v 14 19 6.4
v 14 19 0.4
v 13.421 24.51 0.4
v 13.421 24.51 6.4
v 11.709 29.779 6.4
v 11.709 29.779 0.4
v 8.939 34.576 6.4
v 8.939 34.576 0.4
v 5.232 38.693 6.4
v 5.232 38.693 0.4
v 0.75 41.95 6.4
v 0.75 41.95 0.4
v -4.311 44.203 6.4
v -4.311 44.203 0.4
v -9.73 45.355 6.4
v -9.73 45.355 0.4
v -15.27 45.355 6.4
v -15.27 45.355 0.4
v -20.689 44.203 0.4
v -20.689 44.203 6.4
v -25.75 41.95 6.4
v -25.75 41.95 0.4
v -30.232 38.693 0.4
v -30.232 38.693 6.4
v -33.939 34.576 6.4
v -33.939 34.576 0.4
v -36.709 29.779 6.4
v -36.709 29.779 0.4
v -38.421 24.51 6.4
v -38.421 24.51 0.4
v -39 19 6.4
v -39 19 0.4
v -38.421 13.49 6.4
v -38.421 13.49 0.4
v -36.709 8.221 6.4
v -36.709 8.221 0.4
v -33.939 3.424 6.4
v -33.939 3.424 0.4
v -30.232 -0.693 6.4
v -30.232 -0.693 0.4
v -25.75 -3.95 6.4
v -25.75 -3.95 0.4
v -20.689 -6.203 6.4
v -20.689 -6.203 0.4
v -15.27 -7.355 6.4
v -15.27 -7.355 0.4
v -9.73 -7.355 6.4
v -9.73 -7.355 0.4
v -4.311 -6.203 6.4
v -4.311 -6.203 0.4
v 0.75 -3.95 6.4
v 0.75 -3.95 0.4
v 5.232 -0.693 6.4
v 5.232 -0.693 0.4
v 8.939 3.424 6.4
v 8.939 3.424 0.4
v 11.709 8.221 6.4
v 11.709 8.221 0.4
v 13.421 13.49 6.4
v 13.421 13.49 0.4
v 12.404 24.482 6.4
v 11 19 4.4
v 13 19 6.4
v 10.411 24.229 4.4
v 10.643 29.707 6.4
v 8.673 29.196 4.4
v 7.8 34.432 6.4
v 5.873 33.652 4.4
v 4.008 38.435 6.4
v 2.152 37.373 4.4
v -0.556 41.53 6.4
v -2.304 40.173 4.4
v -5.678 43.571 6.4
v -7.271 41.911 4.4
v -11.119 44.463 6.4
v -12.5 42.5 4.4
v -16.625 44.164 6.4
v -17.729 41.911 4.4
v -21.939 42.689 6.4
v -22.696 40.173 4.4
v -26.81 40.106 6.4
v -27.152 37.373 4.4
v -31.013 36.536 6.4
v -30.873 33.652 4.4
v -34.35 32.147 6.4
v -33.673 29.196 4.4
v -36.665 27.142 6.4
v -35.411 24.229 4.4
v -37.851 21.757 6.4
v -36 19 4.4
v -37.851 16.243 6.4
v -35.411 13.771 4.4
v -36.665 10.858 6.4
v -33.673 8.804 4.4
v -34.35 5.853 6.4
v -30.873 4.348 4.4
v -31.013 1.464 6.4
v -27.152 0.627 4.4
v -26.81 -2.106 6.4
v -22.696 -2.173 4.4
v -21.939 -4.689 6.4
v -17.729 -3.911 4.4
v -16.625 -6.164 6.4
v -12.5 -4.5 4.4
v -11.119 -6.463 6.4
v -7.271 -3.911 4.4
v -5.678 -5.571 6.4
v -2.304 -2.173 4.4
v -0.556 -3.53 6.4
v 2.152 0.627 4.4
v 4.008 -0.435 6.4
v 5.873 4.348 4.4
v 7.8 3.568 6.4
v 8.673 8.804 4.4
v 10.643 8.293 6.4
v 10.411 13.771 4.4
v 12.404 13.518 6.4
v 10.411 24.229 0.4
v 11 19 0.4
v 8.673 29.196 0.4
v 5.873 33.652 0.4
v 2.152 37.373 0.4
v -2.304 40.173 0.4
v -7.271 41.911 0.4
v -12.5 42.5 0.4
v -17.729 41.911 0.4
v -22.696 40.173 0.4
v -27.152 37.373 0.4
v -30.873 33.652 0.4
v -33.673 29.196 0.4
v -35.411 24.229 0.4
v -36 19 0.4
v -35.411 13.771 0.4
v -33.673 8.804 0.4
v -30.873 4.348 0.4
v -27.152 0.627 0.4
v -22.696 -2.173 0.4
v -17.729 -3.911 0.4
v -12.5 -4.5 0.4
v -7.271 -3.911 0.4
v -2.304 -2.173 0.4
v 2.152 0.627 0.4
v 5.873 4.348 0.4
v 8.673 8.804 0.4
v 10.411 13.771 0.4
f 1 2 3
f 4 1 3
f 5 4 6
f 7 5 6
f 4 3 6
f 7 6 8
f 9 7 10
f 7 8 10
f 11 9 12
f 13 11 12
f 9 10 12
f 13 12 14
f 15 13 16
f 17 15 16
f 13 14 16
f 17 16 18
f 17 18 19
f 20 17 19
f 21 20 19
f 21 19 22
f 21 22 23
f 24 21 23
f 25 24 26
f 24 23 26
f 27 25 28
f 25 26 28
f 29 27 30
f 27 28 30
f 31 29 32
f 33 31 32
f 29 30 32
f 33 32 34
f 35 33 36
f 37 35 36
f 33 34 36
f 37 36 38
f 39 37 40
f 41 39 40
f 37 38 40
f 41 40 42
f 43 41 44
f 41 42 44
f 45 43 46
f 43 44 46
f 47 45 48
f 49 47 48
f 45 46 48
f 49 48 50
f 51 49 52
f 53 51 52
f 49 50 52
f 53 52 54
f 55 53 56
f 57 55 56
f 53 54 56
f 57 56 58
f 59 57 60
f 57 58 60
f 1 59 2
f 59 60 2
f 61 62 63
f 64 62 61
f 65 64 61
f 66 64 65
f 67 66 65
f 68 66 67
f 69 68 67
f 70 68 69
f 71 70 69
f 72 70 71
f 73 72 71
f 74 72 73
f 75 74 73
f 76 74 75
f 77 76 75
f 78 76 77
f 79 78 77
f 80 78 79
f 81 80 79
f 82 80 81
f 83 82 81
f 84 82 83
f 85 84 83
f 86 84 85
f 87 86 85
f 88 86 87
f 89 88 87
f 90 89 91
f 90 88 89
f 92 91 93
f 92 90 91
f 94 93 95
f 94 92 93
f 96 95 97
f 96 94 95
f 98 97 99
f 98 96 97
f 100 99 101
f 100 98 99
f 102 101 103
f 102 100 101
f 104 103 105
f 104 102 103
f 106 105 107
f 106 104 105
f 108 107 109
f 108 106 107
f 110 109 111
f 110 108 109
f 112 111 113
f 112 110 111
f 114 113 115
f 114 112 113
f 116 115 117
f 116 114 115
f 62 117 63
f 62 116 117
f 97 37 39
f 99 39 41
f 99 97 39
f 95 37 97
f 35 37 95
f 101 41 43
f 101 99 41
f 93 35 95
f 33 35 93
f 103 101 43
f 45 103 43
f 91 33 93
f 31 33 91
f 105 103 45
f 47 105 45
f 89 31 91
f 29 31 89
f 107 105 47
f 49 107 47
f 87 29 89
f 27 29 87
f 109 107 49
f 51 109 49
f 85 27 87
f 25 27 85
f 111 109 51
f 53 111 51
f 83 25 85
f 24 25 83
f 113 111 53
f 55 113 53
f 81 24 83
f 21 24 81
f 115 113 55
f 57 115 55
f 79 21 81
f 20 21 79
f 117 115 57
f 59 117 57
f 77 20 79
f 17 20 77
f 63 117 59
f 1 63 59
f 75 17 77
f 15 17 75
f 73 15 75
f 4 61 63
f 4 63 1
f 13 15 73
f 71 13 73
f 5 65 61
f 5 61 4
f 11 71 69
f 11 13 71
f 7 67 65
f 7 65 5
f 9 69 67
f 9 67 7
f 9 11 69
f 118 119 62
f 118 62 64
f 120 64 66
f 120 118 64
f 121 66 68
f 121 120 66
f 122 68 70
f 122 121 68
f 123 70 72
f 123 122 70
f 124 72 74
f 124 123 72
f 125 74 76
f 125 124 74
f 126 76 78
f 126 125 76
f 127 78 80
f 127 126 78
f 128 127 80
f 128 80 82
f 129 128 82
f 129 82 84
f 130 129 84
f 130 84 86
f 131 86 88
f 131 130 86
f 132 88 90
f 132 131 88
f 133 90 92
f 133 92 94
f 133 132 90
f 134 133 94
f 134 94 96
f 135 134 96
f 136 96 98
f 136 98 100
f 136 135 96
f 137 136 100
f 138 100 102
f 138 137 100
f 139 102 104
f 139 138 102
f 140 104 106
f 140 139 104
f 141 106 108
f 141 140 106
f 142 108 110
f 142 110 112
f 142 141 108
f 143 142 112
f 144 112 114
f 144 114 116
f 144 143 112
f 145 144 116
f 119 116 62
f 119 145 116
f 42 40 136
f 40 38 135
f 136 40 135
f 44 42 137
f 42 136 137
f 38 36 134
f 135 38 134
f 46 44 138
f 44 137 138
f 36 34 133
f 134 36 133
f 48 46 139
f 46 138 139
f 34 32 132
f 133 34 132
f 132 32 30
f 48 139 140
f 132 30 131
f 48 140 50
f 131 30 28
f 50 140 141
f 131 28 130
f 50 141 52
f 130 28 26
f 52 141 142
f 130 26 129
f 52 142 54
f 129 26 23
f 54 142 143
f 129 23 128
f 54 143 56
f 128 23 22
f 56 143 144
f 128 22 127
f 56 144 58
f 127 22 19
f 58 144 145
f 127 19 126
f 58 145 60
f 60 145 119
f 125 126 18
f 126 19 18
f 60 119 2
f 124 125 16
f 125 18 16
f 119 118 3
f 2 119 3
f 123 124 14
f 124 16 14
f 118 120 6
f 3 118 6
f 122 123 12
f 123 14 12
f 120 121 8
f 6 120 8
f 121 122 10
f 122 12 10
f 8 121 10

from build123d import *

# Parameters (mm, degrees)
CYLINDER025_R     = 23.5
CYLINDER025_DEPTH = 6
CYLINDER024_R     = 26.5
CYLINDER024_DEPTH = 6
CHAMFER013_SIZE   = 2


with BuildPart() as arco_interior_vaciado:
    # Cylinder025 → Cylinder025 (new body)
    with BuildSketch(Plane(origin=(-12.5, 19, -10.6), x_dir=(1, 0, 0), z_dir=(0, 0, 1))):
        Circle(CYLINDER025_R)
    extrude(amount=CYLINDER025_DEPTH)


with BuildPart() as aro:
    # Cylinder024 → Cylinder024 (new body)
    with BuildSketch(Plane(origin=(-12.5, 19, -10.6), x_dir=(1, 0, 0), z_dir=(0, 0, 1))):
        Circle(CYLINDER024_R)
    extrude(amount=CYLINDER024_DEPTH)

    # Cut012: cut arco interior vaciado
    add(arco_interior_vaciado.part, mode=Mode.SUBTRACT)


with BuildPart() as aro_1:
    # Cut012 placement: moved
    add(aro.part.moved(Location((0, 0, 11))))

    # Chamfer013
    chamfer013_edges = [aro_1.edges().sort_by_distance(p)[0] for p in [
        (-36, 19, 6.4),
    ]]
    chamfer(chamfer013_edges, length=CHAMFER013_SIZE)


solid = aro_1.part
